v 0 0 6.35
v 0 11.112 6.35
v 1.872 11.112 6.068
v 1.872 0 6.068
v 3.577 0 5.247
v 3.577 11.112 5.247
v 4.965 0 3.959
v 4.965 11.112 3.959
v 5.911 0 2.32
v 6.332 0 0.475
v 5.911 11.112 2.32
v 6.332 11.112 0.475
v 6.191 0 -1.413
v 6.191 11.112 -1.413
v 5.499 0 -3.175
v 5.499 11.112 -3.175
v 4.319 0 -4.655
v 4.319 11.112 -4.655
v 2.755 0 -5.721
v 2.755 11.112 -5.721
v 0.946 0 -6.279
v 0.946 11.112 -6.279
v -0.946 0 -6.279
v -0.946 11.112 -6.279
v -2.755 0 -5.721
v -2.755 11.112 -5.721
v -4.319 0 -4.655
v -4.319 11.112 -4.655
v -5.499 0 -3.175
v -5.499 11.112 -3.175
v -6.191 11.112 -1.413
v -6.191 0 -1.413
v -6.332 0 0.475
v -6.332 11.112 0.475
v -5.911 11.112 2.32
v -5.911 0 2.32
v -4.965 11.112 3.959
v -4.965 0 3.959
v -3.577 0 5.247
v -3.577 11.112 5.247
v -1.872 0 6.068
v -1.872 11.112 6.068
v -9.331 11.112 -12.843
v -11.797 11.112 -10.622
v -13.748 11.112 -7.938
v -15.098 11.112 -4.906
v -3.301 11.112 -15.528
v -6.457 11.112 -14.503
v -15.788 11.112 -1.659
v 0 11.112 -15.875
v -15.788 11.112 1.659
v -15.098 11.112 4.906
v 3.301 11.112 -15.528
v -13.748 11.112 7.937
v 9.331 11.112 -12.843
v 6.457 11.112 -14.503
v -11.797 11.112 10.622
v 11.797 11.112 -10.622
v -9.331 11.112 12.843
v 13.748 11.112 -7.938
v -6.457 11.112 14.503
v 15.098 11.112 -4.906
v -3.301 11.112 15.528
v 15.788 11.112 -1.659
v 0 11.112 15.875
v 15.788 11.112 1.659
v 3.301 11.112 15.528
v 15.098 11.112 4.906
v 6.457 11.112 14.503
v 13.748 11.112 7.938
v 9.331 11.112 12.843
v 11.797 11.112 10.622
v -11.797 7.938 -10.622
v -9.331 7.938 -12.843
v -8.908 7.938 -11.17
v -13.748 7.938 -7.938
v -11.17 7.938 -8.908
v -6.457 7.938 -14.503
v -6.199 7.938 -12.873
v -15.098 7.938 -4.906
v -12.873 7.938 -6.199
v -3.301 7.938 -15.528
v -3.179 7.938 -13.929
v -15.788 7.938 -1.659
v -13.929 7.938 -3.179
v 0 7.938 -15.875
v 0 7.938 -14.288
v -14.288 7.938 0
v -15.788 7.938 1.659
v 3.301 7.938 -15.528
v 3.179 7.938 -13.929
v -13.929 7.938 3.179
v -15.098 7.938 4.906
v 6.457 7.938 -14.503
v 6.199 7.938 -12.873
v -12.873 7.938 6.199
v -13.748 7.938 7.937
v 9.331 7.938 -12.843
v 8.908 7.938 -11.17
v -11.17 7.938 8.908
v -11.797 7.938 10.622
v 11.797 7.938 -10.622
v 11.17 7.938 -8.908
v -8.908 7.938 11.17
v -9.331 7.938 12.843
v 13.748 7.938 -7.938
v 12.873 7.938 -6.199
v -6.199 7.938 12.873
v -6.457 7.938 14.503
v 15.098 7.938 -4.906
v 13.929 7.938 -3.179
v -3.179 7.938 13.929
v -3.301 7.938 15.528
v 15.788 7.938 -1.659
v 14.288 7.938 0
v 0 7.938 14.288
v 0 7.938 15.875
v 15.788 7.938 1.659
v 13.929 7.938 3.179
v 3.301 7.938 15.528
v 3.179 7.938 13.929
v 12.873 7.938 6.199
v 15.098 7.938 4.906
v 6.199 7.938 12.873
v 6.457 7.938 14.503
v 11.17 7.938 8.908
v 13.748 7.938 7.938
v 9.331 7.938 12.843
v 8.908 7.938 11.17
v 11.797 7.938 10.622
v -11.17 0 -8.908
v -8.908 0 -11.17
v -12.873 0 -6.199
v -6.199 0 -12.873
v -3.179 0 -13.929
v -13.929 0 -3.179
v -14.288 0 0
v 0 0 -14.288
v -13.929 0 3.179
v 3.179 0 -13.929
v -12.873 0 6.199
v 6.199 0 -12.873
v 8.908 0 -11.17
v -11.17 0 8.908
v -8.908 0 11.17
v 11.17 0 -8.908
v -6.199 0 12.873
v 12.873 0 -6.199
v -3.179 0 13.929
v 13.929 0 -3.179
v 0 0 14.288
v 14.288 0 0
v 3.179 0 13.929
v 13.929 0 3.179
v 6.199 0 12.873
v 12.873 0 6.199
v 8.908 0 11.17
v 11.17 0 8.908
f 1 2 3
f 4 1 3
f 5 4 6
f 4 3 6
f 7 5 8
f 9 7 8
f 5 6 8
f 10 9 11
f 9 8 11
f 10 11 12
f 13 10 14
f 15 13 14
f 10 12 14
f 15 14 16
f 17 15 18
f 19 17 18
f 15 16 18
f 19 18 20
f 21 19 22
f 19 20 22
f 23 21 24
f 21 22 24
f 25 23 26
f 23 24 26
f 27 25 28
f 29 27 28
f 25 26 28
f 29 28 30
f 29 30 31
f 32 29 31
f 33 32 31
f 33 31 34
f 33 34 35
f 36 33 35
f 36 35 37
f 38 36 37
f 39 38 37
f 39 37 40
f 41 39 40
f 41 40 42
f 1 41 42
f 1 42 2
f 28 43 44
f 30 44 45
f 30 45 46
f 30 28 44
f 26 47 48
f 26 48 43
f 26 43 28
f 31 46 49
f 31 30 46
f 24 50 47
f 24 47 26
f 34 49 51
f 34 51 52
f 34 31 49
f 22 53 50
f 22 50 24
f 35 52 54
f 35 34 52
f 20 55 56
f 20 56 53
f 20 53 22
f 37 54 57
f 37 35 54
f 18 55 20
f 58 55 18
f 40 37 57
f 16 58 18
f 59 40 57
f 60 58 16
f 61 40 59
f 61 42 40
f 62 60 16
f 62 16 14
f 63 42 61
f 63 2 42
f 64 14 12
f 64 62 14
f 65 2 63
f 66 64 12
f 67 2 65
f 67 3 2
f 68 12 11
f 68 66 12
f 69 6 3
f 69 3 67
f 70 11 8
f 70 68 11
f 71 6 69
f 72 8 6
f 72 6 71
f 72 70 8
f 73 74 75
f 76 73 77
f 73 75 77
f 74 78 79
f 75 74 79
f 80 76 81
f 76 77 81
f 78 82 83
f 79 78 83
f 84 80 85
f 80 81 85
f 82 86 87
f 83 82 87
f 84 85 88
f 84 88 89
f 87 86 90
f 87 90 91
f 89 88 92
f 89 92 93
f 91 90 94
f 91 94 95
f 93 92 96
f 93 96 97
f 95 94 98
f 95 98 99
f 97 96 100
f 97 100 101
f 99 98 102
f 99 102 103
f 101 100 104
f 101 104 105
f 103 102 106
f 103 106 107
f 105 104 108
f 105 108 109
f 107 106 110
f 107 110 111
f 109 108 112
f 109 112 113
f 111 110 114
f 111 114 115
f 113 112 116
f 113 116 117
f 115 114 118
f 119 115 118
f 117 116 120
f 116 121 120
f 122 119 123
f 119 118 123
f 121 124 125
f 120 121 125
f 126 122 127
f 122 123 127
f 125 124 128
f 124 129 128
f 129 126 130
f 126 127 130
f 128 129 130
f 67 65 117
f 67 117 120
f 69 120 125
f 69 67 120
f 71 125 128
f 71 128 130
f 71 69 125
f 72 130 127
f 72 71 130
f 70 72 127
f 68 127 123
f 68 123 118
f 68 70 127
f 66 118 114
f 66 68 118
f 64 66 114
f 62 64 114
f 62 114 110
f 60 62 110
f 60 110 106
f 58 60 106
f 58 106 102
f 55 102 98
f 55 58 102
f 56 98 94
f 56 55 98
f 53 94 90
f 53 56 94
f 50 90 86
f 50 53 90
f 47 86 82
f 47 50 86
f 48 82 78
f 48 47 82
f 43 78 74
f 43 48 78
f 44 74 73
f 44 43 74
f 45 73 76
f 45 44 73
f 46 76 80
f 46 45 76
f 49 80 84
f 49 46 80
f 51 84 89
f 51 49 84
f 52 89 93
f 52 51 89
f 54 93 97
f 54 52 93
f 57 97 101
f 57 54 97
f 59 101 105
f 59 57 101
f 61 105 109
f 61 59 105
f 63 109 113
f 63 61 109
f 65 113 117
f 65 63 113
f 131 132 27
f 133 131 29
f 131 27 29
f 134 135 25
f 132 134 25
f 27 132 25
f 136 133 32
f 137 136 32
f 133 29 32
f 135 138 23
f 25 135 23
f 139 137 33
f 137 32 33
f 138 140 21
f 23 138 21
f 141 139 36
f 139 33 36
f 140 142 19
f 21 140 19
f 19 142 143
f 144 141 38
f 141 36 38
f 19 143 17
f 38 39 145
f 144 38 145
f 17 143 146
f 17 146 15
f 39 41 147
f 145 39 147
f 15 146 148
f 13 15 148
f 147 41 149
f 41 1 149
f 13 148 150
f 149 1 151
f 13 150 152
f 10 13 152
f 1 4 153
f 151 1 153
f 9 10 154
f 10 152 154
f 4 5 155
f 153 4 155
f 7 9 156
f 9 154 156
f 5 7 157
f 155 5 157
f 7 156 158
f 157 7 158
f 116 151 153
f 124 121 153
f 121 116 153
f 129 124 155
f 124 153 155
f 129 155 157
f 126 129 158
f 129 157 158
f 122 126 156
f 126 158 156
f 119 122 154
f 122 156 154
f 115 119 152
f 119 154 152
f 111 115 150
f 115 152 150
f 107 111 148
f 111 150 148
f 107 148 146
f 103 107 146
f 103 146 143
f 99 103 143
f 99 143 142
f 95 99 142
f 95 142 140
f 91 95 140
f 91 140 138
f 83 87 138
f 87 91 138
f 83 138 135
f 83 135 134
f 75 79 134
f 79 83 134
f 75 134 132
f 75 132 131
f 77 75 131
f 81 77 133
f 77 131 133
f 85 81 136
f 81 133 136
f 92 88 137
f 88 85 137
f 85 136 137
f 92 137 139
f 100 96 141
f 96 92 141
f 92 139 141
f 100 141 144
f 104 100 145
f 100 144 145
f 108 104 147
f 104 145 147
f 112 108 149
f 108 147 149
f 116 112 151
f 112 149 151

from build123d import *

# Parameters (mm, degrees)
SKETCH1_R           = 14.2875
BOSS_EXTRUDE1_DEPTH = 11.1125
SKETCH2_R           = 15.875
BOSS_EXTRUDE2_DEPTH = 3.175
SKETCH3_R           = 6.35
CUT_EXTRUDE1_DEPTH  = 26.050327468


with BuildPart() as part:
    # Sketch1 → Boss-Extrude1 (new body)
    with BuildSketch(Plane(origin=(0, 0, 0), x_dir=(1, 0, 0), z_dir=(0, 1, 0))):
        with Locations(Location((0, 0, 0), (0, 0, 270))):
            Circle(SKETCH1_R)
    extrude(amount=BOSS_EXTRUDE1_DEPTH)

    # Sketch2 → Boss-Extrude2 (add)
    with BuildSketch(Plane(origin=(0, 11.1125, 0), x_dir=(1, 0, 0), z_dir=(0, 1, 0))):
        with Locations(Location((0, 0, 0), (0, 0, 270))):
            Circle(SKETCH2_R)
    extrude(amount=-BOSS_EXTRUDE2_DEPTH)

    # Sketch3 → Cut-Extrude1 (cut, through all)
    with BuildSketch(Plane(origin=(0, 11.1125, 0), x_dir=(1, 0, 0), z_dir=(0, 1, 0))):
        with Locations(Location((0, 0, 0), (0, 0, 270))):
            Circle(SKETCH3_R)
    extrude(amount=-CUT_EXTRUDE1_DEPTH, mode=Mode.SUBTRACT)


solid = part.part
